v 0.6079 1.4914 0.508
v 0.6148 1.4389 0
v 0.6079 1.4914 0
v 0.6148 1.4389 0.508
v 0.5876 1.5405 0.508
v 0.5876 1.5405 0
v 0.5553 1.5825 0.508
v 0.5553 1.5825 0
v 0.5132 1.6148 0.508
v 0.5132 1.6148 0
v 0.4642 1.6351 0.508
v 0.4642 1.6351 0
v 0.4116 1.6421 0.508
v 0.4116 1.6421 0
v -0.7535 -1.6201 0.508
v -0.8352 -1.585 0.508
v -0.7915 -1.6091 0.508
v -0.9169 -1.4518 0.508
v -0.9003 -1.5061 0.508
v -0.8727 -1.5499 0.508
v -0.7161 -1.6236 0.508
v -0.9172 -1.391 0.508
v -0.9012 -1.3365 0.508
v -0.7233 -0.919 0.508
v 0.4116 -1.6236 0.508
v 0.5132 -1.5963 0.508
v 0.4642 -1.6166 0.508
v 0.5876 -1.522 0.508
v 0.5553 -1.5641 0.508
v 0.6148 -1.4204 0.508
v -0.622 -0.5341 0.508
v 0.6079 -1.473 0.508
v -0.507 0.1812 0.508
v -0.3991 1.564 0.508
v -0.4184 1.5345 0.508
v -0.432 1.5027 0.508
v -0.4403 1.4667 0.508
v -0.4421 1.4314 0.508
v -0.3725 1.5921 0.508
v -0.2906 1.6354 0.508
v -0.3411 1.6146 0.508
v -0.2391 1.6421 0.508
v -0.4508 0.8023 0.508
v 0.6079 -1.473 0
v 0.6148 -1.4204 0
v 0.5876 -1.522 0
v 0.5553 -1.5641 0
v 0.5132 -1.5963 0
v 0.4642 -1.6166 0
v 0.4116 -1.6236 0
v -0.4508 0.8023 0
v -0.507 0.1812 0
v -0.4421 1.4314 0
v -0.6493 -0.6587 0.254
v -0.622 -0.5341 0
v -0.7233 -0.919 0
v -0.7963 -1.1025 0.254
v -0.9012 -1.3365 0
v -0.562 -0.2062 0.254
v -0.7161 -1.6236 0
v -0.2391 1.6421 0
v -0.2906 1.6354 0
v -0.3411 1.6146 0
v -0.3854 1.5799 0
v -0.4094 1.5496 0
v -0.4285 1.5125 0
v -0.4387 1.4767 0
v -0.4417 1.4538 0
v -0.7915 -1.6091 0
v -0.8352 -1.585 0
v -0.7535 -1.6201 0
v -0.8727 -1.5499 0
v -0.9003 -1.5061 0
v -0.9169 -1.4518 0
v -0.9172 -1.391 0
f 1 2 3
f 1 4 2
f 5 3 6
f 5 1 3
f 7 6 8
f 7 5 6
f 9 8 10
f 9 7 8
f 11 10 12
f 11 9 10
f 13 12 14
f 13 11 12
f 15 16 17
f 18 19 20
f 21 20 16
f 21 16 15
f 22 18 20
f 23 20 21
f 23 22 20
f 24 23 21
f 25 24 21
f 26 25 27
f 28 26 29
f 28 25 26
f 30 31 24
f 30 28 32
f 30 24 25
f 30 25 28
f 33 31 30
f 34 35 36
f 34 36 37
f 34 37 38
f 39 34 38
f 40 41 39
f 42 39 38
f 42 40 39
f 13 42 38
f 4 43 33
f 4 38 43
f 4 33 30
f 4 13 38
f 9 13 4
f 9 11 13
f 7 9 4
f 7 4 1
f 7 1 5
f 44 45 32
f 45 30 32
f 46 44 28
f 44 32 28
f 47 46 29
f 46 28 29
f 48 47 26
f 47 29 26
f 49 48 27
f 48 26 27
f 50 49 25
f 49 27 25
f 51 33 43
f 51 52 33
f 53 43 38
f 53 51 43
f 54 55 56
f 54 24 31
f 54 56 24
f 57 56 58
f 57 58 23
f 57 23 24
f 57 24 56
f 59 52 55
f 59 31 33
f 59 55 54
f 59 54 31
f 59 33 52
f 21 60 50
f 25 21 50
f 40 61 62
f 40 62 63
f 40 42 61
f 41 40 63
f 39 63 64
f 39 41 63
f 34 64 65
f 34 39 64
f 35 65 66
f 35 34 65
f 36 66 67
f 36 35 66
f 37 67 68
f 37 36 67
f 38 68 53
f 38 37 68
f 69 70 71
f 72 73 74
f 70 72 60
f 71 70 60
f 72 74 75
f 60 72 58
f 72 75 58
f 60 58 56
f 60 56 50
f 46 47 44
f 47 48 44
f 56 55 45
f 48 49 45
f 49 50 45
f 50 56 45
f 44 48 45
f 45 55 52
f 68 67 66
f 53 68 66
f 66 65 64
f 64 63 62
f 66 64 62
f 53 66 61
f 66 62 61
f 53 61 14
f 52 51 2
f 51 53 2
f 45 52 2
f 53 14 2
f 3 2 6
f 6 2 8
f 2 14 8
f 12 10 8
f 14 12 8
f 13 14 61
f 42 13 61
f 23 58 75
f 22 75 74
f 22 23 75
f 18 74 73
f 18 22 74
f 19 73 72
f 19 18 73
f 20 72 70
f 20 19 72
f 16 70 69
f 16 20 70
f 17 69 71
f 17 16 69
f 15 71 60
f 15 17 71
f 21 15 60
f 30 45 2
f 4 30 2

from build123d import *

# Parameters (mm, degrees)
F1_DEPTH = 0.508
F2_R     = 0.2032


with BuildPart() as f1:
    # F0 (on Top) → F1 (new body)
    with BuildSketch(Plane.XY):
        with BuildLine():
            Line((0.6148488762, -1.6235694056), (0.6148488762, 1.642056508))
            Line((0.6148488762, 1.642056508), (-0.4544672556, 1.642056508))
            add(Edge.make_bspline(
                [(-1.0296626715, -1.6235694056), (-0.7884516963, -1.0762058664), (-0.6325170849, -0.8539978213), (-0.3895258124, 0.8534820518), (-0.4544672556, 1.642056508)],
                knots=[0, 0, 0, 0, 0.4012668024, 1, 1, 1, 1], degree=3))
            Line((-1.0296626715, -1.6235694056), (0.6148488762, -1.6235694056))
        make_face()
    extrude(amount=F1_DEPTH)

    # F2
    f2_edges = [f1.edges().sort_by_distance(p)[0] for p in [
        (-1.029663, -1.623569, 0.254),
        (-0.454467, 1.642057, 0.254),
        (0.614849, -1.623569, 0.254),
        (0.614849, 1.642057, 0.254),
    ]]
    fillet(f2_edges, radius=F2_R)


solid = f1.part
